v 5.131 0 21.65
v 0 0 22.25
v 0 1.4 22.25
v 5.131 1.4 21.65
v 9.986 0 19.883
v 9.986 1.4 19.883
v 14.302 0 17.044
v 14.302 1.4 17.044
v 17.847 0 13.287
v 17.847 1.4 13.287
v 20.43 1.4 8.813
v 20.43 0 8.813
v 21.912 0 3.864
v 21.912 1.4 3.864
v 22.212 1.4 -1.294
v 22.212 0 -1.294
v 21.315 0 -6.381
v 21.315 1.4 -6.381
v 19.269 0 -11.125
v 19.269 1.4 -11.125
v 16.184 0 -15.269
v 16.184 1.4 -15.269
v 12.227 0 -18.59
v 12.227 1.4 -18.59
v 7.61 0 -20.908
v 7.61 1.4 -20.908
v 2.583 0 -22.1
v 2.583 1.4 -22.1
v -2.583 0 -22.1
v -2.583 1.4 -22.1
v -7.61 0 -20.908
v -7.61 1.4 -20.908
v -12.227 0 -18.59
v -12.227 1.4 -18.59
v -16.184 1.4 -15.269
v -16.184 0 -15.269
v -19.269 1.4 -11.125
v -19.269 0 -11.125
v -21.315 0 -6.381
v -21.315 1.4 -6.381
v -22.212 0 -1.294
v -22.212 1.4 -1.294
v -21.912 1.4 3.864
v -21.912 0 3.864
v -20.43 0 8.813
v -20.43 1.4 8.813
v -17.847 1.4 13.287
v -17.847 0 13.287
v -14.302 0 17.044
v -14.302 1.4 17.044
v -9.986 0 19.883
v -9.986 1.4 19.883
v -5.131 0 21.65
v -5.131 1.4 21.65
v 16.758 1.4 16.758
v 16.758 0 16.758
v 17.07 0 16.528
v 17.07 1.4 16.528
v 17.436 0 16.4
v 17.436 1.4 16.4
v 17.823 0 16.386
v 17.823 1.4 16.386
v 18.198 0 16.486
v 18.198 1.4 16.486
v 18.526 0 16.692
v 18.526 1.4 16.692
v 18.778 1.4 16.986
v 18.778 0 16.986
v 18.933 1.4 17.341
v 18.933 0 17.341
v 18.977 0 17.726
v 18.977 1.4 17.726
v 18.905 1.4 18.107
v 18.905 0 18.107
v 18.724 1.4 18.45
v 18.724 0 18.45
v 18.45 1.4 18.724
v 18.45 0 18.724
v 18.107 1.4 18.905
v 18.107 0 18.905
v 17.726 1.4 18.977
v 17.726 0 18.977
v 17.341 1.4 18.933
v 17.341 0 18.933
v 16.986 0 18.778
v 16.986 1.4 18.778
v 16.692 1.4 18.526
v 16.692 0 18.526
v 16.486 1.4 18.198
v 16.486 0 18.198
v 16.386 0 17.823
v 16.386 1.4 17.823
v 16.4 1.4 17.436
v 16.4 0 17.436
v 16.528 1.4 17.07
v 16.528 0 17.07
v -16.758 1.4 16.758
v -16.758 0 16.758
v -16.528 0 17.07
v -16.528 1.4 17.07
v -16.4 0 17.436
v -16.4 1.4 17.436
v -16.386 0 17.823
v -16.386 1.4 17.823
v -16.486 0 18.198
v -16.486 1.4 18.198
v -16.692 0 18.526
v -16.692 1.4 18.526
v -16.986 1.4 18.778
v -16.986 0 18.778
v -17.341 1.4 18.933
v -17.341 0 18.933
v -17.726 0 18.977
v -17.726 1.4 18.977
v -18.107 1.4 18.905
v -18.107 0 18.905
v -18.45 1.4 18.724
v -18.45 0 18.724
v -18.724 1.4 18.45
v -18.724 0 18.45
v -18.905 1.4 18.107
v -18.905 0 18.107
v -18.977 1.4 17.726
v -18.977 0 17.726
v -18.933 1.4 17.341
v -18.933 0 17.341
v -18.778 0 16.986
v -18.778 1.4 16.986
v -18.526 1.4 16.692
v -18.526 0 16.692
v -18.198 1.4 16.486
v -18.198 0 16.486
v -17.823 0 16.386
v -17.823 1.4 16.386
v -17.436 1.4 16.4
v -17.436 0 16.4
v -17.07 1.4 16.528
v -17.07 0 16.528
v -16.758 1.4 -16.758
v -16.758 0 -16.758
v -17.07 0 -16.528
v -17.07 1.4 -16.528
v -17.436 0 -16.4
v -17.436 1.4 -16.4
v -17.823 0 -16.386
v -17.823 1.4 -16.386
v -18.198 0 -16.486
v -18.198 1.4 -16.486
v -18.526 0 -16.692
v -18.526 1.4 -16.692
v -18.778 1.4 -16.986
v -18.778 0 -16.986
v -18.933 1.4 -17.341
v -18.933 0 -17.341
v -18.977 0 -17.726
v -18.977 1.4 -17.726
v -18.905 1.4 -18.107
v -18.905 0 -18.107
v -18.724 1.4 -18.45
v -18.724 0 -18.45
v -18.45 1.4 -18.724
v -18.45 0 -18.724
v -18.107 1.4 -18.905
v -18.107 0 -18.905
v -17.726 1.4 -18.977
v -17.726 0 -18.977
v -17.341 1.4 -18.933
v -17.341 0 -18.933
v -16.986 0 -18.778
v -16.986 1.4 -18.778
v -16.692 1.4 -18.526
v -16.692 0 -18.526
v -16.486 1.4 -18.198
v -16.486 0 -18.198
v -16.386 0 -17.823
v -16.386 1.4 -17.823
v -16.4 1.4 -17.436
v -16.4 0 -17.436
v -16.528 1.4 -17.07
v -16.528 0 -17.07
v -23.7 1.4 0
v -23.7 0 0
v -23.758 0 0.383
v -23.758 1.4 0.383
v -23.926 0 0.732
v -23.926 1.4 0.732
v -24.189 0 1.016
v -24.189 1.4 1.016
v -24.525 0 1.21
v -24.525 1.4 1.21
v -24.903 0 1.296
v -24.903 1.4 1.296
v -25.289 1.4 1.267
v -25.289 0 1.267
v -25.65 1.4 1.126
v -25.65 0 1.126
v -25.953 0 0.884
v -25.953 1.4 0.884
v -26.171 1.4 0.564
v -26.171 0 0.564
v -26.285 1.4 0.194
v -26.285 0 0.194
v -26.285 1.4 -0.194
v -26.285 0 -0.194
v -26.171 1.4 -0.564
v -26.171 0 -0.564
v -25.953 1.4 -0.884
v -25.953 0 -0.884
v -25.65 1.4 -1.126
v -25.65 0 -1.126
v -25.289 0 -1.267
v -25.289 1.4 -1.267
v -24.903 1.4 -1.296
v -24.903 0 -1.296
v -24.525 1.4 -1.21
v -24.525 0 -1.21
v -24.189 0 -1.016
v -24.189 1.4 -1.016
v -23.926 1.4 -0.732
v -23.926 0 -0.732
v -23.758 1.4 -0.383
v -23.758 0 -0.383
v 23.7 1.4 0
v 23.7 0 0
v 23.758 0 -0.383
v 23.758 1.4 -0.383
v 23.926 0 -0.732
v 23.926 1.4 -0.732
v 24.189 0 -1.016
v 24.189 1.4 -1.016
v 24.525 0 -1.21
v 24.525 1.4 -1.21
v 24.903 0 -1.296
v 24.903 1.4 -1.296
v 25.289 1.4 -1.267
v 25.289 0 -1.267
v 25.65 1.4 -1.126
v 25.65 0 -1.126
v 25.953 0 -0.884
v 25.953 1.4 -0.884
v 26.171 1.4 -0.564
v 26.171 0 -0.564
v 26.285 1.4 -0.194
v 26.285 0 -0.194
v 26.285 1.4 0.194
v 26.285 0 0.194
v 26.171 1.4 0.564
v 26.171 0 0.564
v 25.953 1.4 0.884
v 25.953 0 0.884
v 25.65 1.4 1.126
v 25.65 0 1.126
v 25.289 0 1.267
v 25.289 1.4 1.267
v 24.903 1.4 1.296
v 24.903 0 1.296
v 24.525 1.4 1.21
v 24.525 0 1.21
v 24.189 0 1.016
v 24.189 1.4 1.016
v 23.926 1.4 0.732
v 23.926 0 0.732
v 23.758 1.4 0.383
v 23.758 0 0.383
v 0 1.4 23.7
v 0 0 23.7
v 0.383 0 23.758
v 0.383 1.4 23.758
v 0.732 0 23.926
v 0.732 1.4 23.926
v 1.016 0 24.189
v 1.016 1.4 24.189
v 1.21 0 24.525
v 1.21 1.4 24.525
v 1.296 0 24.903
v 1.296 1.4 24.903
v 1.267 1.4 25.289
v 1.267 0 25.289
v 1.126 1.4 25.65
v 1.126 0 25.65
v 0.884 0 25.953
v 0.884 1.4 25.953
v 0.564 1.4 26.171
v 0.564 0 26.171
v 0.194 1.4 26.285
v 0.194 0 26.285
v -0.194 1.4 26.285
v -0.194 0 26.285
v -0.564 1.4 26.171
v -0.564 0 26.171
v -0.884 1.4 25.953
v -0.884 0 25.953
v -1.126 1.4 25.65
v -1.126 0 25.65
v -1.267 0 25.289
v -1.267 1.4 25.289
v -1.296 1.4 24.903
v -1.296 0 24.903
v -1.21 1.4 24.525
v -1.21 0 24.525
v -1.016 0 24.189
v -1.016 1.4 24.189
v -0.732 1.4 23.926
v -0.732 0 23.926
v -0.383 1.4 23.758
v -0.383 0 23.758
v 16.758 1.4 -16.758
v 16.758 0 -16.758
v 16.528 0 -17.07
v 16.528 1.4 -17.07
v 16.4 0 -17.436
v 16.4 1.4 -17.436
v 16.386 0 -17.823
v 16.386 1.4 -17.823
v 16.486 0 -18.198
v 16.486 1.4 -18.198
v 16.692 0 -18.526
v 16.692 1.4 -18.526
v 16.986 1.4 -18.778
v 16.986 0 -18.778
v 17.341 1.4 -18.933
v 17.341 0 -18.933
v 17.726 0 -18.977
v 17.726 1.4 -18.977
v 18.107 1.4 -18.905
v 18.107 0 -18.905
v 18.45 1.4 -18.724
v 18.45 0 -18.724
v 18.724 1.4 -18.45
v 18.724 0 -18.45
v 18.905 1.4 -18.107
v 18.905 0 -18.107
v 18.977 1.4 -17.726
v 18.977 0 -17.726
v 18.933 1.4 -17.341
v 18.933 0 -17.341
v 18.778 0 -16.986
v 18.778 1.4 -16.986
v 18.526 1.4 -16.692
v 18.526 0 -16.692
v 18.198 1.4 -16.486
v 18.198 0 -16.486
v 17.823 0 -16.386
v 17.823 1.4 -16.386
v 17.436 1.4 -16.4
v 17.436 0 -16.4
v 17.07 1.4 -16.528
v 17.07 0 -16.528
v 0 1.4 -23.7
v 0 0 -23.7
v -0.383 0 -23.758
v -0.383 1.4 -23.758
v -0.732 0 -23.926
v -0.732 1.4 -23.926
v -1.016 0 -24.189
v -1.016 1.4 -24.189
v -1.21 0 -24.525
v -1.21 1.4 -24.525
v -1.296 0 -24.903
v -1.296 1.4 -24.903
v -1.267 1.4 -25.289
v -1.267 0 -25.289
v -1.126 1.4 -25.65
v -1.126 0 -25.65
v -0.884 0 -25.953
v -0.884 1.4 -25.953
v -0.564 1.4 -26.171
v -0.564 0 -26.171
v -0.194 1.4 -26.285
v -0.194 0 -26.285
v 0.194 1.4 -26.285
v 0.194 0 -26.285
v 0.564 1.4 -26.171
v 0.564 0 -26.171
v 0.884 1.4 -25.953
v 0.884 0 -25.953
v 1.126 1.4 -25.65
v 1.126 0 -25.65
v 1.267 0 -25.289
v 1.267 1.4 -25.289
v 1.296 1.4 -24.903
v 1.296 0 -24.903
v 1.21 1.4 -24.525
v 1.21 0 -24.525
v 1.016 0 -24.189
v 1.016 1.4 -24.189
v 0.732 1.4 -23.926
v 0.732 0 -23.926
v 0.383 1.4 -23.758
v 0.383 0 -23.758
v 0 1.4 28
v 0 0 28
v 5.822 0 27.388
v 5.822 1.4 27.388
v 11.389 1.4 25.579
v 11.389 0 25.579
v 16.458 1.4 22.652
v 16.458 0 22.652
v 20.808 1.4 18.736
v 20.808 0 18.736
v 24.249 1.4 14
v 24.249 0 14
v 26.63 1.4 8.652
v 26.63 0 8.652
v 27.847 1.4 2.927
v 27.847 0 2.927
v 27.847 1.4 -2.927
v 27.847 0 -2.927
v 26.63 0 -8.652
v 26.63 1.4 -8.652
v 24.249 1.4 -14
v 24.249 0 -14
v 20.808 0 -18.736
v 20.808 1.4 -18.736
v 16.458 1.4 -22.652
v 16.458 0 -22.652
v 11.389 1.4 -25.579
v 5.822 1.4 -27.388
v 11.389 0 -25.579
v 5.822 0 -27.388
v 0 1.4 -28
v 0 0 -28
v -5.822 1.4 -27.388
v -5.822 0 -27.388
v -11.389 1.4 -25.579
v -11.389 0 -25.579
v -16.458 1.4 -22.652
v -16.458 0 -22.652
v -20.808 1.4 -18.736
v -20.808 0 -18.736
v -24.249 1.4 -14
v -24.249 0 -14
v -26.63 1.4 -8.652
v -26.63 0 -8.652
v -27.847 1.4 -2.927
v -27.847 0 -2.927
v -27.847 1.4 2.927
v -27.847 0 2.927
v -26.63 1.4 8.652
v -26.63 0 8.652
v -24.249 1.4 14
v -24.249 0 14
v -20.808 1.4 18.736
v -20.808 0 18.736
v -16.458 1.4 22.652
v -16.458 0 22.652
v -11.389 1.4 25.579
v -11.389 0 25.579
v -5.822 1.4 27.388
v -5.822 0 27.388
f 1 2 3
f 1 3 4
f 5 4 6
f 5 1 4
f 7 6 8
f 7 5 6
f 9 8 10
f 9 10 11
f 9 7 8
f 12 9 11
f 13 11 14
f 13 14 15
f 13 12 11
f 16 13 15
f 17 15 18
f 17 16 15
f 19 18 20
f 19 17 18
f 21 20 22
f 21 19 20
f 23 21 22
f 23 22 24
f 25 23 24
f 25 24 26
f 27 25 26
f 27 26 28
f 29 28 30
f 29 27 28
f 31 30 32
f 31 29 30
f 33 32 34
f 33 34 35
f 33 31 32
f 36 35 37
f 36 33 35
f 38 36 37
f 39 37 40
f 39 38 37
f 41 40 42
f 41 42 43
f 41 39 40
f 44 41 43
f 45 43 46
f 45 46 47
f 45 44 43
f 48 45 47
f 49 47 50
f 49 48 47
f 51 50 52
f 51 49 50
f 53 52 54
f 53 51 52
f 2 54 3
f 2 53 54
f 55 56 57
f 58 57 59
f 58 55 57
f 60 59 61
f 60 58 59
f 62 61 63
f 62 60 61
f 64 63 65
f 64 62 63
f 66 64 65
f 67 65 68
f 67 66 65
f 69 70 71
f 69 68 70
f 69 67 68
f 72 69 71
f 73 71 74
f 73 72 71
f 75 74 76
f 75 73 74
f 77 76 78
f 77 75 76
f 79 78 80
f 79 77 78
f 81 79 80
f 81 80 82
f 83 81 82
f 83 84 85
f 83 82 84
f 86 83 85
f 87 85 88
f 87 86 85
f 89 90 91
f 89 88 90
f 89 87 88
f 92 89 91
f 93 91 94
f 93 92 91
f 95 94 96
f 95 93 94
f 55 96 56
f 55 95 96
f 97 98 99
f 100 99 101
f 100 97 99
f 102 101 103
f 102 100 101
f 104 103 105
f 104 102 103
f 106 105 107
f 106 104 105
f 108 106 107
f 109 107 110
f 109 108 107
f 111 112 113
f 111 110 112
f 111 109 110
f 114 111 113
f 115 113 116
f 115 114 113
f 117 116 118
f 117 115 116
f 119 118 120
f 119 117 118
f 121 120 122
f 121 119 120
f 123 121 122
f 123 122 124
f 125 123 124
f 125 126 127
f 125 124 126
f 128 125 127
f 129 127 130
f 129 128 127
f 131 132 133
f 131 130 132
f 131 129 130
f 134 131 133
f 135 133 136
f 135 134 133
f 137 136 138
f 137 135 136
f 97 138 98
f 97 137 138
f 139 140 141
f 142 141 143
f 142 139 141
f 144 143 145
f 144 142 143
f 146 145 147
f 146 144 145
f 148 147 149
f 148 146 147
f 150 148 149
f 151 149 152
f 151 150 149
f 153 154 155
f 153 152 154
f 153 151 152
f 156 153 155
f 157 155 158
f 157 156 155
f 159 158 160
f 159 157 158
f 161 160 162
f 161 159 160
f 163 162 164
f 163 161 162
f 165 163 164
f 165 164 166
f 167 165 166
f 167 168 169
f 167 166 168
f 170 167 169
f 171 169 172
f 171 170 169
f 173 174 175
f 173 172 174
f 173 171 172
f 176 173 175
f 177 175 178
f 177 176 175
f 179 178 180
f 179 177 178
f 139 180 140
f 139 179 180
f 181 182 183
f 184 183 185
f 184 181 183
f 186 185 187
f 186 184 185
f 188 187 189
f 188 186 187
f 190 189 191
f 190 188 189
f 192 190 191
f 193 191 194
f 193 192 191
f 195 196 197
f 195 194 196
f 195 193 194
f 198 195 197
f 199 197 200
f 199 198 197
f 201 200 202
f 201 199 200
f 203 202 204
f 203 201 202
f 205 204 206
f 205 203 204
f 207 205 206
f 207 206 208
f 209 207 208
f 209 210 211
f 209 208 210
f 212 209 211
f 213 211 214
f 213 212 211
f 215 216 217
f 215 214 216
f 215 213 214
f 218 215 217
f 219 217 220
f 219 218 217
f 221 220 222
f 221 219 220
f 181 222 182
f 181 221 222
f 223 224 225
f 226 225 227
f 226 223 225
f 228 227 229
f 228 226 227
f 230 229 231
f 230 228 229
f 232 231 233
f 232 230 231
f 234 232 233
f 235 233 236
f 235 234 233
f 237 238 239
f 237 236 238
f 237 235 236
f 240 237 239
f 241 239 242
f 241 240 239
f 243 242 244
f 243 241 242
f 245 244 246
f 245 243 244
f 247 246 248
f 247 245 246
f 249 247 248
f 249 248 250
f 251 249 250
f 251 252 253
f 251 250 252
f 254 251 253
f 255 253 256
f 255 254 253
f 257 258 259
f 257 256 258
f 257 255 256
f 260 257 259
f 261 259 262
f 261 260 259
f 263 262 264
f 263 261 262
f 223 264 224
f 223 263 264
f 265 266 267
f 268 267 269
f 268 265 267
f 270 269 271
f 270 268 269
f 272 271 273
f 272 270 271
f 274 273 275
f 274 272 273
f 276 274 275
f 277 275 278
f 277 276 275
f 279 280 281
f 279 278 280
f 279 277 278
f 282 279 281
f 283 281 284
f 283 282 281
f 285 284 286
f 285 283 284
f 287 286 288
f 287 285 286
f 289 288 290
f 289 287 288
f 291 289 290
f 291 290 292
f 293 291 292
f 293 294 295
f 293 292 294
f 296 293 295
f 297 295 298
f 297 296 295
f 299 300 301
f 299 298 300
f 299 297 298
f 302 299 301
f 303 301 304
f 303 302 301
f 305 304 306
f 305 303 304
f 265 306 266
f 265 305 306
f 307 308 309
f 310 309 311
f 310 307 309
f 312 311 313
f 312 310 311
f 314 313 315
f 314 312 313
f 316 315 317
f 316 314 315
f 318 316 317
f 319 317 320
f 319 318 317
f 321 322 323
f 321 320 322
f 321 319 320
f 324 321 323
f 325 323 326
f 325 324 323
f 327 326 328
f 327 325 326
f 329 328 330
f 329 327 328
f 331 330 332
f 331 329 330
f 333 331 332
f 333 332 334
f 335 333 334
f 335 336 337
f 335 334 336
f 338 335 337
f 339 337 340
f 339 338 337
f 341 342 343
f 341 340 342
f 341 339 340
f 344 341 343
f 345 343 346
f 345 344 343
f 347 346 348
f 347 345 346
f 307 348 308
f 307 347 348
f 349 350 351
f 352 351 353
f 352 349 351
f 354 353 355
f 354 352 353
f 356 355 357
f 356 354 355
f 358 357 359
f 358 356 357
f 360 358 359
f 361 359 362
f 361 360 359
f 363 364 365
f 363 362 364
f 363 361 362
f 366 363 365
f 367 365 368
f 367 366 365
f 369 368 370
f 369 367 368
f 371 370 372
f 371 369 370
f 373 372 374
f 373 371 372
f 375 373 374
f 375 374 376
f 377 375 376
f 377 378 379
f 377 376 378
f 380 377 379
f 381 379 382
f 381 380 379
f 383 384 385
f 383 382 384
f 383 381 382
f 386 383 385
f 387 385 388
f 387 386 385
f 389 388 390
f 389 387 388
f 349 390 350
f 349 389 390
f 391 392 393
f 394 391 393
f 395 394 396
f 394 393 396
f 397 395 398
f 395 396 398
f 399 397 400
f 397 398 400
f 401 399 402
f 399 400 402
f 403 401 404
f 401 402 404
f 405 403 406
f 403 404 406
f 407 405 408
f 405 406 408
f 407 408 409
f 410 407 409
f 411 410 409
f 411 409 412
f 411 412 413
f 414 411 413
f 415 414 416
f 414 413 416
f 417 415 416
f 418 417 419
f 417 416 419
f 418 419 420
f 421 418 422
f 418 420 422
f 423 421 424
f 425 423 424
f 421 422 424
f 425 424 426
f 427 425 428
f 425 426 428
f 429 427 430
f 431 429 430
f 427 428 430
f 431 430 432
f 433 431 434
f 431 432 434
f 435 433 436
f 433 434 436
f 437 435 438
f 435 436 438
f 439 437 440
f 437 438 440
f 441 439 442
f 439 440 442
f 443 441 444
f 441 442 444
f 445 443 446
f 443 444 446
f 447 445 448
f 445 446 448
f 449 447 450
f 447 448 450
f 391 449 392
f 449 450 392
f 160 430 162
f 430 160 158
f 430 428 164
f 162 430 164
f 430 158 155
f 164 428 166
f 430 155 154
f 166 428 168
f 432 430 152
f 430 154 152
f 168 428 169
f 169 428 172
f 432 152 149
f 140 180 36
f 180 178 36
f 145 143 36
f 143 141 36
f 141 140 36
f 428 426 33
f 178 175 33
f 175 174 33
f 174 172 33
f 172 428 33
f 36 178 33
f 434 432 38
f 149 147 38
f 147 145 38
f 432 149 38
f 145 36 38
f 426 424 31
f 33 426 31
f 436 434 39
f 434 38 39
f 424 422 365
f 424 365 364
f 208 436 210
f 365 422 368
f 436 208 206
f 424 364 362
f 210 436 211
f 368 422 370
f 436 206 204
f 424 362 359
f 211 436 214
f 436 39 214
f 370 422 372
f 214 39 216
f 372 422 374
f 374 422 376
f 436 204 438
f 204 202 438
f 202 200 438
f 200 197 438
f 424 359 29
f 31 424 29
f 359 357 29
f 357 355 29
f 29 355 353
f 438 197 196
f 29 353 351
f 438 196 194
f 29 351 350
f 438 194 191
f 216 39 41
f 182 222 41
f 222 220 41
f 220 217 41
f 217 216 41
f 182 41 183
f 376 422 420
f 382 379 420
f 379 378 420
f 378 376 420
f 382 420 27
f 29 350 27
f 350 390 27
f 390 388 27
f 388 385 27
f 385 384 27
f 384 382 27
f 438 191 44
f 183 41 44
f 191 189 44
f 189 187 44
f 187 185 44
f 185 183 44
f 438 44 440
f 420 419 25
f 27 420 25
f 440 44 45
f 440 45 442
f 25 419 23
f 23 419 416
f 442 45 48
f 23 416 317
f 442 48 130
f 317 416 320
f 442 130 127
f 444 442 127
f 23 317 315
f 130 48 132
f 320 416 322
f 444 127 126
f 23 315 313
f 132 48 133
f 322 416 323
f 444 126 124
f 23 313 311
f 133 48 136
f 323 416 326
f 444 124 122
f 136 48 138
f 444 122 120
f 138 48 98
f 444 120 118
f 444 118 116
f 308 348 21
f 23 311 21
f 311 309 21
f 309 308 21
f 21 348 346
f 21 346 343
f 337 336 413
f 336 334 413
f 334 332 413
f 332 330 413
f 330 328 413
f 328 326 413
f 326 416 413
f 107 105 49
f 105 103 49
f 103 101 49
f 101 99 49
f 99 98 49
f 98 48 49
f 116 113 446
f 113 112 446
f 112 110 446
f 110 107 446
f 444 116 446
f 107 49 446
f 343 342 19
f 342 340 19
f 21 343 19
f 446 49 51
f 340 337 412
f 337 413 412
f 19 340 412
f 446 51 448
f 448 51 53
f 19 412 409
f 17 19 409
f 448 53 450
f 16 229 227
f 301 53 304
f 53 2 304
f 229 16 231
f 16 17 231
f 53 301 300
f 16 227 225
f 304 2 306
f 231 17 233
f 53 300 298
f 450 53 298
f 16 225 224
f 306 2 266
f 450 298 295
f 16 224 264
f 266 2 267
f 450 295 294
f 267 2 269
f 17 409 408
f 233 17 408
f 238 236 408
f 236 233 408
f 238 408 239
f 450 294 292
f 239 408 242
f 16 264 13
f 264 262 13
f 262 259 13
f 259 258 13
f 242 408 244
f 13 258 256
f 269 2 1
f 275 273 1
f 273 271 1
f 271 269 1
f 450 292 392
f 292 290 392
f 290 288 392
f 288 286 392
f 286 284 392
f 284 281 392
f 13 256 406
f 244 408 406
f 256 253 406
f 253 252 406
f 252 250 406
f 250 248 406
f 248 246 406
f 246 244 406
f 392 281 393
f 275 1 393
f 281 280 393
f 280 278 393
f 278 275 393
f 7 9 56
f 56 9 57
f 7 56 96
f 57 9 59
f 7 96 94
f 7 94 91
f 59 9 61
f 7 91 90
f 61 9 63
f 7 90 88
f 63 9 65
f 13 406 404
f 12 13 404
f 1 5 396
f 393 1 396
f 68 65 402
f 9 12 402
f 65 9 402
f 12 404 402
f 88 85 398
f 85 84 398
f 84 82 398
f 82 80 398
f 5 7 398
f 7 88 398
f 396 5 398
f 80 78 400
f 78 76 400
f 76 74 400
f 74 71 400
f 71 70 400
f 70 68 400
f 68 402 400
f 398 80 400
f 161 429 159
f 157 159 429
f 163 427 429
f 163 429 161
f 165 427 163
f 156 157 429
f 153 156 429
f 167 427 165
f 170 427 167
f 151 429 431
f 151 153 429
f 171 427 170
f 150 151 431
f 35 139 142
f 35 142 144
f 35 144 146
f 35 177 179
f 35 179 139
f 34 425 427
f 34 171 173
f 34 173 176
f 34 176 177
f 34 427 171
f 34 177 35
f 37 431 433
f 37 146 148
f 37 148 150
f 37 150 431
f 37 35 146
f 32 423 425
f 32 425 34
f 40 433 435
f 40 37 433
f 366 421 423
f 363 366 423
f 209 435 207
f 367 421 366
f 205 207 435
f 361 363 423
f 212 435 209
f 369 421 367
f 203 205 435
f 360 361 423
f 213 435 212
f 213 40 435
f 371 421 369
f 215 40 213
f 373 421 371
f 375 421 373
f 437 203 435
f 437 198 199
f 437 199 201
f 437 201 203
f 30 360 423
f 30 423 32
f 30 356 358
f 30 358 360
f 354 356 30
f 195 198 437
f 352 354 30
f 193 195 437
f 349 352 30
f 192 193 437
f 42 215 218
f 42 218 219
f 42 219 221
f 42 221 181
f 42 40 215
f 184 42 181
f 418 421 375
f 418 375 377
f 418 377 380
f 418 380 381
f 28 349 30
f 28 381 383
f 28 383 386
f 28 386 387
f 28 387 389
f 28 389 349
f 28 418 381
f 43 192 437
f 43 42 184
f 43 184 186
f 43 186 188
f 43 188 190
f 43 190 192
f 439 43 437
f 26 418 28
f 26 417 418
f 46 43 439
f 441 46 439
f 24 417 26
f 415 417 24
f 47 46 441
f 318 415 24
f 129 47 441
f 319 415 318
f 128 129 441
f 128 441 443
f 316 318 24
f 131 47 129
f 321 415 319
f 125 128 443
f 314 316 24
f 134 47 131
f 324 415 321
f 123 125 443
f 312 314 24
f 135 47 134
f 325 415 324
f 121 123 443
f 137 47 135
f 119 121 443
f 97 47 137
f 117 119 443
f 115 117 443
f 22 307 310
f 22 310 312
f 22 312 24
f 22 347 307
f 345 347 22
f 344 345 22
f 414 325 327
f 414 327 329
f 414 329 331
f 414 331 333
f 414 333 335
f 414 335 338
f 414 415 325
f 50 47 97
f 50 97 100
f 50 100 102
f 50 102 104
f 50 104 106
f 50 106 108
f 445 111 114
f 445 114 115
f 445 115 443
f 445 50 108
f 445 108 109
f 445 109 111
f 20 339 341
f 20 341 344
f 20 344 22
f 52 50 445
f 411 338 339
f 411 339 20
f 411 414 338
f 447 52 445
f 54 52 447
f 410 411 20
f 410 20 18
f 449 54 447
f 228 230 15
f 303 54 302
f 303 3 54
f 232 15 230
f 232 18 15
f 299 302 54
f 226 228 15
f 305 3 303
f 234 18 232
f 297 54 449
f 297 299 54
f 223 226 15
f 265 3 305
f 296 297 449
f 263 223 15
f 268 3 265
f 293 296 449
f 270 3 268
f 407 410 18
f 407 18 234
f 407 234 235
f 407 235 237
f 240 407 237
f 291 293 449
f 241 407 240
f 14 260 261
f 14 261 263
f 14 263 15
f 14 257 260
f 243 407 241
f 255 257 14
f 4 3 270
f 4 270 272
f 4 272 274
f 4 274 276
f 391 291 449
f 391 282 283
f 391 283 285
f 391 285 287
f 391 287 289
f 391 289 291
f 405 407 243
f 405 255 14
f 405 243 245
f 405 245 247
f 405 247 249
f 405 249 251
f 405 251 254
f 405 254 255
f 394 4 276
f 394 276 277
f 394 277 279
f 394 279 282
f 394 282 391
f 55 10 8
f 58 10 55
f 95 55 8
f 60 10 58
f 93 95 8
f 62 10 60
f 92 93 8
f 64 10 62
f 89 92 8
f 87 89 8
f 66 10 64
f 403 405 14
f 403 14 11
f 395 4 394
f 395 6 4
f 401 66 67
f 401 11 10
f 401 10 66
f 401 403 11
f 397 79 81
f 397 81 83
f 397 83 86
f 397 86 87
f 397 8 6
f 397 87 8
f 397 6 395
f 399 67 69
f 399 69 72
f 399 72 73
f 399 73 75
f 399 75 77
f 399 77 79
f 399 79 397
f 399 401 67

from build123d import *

# Parameters (mm, degrees)
SKETCH1_R           = 28
SKETCH1_R_2         = 22.25
BOSS_EXTRUDE1_DEPTH = 1.4
CIRPATTERN1_COUNT   = 8


with BuildPart() as part:
    # Sketch1 → Boss-Extrude1 (new body)
    with BuildSketch(Plane(origin=(0, 0, 0), x_dir=(1, 0, 0), z_dir=(0, 1, 0))):
        with Locations(Location((0, 0, 0), (0, 0, 270))):
            Circle(SKETCH1_R)
        with Locations(Location((0, 0, 0), (0, 0, 270))):
            Circle(SKETCH1_R_2, mode=Mode.SUBTRACT)
    extrude(amount=BOSS_EXTRUDE1_DEPTH)

    # Sketch4 → M2 Clearance Hole1 (revolve, cut)
    with BuildSketch(Plane(origin=(0, 1.4, -25), x_dir=(0, 0, 1), z_dir=(1, 0, 0))):
        Polygon((0, 0), (0, 17.799118805), (1.3, 17.018), (1.3, 0), align=None)
    m2_clearance_hole1 = revolve(axis=Axis((0, 7.75, -25), (0, -1, 0)), mode=Mode.SUBTRACT)

    # CirPattern1: M2 Clearance Hole1 ×8 about axis
    cirpattern1_axis = Axis((0, 0, 0), (0, 1, 0))
    for i in range(1, CIRPATTERN1_COUNT):
        add(m2_clearance_hole1.rotate(cirpattern1_axis, i * 360 / CIRPATTERN1_COUNT), mode=Mode.SUBTRACT)


solid = part.part
